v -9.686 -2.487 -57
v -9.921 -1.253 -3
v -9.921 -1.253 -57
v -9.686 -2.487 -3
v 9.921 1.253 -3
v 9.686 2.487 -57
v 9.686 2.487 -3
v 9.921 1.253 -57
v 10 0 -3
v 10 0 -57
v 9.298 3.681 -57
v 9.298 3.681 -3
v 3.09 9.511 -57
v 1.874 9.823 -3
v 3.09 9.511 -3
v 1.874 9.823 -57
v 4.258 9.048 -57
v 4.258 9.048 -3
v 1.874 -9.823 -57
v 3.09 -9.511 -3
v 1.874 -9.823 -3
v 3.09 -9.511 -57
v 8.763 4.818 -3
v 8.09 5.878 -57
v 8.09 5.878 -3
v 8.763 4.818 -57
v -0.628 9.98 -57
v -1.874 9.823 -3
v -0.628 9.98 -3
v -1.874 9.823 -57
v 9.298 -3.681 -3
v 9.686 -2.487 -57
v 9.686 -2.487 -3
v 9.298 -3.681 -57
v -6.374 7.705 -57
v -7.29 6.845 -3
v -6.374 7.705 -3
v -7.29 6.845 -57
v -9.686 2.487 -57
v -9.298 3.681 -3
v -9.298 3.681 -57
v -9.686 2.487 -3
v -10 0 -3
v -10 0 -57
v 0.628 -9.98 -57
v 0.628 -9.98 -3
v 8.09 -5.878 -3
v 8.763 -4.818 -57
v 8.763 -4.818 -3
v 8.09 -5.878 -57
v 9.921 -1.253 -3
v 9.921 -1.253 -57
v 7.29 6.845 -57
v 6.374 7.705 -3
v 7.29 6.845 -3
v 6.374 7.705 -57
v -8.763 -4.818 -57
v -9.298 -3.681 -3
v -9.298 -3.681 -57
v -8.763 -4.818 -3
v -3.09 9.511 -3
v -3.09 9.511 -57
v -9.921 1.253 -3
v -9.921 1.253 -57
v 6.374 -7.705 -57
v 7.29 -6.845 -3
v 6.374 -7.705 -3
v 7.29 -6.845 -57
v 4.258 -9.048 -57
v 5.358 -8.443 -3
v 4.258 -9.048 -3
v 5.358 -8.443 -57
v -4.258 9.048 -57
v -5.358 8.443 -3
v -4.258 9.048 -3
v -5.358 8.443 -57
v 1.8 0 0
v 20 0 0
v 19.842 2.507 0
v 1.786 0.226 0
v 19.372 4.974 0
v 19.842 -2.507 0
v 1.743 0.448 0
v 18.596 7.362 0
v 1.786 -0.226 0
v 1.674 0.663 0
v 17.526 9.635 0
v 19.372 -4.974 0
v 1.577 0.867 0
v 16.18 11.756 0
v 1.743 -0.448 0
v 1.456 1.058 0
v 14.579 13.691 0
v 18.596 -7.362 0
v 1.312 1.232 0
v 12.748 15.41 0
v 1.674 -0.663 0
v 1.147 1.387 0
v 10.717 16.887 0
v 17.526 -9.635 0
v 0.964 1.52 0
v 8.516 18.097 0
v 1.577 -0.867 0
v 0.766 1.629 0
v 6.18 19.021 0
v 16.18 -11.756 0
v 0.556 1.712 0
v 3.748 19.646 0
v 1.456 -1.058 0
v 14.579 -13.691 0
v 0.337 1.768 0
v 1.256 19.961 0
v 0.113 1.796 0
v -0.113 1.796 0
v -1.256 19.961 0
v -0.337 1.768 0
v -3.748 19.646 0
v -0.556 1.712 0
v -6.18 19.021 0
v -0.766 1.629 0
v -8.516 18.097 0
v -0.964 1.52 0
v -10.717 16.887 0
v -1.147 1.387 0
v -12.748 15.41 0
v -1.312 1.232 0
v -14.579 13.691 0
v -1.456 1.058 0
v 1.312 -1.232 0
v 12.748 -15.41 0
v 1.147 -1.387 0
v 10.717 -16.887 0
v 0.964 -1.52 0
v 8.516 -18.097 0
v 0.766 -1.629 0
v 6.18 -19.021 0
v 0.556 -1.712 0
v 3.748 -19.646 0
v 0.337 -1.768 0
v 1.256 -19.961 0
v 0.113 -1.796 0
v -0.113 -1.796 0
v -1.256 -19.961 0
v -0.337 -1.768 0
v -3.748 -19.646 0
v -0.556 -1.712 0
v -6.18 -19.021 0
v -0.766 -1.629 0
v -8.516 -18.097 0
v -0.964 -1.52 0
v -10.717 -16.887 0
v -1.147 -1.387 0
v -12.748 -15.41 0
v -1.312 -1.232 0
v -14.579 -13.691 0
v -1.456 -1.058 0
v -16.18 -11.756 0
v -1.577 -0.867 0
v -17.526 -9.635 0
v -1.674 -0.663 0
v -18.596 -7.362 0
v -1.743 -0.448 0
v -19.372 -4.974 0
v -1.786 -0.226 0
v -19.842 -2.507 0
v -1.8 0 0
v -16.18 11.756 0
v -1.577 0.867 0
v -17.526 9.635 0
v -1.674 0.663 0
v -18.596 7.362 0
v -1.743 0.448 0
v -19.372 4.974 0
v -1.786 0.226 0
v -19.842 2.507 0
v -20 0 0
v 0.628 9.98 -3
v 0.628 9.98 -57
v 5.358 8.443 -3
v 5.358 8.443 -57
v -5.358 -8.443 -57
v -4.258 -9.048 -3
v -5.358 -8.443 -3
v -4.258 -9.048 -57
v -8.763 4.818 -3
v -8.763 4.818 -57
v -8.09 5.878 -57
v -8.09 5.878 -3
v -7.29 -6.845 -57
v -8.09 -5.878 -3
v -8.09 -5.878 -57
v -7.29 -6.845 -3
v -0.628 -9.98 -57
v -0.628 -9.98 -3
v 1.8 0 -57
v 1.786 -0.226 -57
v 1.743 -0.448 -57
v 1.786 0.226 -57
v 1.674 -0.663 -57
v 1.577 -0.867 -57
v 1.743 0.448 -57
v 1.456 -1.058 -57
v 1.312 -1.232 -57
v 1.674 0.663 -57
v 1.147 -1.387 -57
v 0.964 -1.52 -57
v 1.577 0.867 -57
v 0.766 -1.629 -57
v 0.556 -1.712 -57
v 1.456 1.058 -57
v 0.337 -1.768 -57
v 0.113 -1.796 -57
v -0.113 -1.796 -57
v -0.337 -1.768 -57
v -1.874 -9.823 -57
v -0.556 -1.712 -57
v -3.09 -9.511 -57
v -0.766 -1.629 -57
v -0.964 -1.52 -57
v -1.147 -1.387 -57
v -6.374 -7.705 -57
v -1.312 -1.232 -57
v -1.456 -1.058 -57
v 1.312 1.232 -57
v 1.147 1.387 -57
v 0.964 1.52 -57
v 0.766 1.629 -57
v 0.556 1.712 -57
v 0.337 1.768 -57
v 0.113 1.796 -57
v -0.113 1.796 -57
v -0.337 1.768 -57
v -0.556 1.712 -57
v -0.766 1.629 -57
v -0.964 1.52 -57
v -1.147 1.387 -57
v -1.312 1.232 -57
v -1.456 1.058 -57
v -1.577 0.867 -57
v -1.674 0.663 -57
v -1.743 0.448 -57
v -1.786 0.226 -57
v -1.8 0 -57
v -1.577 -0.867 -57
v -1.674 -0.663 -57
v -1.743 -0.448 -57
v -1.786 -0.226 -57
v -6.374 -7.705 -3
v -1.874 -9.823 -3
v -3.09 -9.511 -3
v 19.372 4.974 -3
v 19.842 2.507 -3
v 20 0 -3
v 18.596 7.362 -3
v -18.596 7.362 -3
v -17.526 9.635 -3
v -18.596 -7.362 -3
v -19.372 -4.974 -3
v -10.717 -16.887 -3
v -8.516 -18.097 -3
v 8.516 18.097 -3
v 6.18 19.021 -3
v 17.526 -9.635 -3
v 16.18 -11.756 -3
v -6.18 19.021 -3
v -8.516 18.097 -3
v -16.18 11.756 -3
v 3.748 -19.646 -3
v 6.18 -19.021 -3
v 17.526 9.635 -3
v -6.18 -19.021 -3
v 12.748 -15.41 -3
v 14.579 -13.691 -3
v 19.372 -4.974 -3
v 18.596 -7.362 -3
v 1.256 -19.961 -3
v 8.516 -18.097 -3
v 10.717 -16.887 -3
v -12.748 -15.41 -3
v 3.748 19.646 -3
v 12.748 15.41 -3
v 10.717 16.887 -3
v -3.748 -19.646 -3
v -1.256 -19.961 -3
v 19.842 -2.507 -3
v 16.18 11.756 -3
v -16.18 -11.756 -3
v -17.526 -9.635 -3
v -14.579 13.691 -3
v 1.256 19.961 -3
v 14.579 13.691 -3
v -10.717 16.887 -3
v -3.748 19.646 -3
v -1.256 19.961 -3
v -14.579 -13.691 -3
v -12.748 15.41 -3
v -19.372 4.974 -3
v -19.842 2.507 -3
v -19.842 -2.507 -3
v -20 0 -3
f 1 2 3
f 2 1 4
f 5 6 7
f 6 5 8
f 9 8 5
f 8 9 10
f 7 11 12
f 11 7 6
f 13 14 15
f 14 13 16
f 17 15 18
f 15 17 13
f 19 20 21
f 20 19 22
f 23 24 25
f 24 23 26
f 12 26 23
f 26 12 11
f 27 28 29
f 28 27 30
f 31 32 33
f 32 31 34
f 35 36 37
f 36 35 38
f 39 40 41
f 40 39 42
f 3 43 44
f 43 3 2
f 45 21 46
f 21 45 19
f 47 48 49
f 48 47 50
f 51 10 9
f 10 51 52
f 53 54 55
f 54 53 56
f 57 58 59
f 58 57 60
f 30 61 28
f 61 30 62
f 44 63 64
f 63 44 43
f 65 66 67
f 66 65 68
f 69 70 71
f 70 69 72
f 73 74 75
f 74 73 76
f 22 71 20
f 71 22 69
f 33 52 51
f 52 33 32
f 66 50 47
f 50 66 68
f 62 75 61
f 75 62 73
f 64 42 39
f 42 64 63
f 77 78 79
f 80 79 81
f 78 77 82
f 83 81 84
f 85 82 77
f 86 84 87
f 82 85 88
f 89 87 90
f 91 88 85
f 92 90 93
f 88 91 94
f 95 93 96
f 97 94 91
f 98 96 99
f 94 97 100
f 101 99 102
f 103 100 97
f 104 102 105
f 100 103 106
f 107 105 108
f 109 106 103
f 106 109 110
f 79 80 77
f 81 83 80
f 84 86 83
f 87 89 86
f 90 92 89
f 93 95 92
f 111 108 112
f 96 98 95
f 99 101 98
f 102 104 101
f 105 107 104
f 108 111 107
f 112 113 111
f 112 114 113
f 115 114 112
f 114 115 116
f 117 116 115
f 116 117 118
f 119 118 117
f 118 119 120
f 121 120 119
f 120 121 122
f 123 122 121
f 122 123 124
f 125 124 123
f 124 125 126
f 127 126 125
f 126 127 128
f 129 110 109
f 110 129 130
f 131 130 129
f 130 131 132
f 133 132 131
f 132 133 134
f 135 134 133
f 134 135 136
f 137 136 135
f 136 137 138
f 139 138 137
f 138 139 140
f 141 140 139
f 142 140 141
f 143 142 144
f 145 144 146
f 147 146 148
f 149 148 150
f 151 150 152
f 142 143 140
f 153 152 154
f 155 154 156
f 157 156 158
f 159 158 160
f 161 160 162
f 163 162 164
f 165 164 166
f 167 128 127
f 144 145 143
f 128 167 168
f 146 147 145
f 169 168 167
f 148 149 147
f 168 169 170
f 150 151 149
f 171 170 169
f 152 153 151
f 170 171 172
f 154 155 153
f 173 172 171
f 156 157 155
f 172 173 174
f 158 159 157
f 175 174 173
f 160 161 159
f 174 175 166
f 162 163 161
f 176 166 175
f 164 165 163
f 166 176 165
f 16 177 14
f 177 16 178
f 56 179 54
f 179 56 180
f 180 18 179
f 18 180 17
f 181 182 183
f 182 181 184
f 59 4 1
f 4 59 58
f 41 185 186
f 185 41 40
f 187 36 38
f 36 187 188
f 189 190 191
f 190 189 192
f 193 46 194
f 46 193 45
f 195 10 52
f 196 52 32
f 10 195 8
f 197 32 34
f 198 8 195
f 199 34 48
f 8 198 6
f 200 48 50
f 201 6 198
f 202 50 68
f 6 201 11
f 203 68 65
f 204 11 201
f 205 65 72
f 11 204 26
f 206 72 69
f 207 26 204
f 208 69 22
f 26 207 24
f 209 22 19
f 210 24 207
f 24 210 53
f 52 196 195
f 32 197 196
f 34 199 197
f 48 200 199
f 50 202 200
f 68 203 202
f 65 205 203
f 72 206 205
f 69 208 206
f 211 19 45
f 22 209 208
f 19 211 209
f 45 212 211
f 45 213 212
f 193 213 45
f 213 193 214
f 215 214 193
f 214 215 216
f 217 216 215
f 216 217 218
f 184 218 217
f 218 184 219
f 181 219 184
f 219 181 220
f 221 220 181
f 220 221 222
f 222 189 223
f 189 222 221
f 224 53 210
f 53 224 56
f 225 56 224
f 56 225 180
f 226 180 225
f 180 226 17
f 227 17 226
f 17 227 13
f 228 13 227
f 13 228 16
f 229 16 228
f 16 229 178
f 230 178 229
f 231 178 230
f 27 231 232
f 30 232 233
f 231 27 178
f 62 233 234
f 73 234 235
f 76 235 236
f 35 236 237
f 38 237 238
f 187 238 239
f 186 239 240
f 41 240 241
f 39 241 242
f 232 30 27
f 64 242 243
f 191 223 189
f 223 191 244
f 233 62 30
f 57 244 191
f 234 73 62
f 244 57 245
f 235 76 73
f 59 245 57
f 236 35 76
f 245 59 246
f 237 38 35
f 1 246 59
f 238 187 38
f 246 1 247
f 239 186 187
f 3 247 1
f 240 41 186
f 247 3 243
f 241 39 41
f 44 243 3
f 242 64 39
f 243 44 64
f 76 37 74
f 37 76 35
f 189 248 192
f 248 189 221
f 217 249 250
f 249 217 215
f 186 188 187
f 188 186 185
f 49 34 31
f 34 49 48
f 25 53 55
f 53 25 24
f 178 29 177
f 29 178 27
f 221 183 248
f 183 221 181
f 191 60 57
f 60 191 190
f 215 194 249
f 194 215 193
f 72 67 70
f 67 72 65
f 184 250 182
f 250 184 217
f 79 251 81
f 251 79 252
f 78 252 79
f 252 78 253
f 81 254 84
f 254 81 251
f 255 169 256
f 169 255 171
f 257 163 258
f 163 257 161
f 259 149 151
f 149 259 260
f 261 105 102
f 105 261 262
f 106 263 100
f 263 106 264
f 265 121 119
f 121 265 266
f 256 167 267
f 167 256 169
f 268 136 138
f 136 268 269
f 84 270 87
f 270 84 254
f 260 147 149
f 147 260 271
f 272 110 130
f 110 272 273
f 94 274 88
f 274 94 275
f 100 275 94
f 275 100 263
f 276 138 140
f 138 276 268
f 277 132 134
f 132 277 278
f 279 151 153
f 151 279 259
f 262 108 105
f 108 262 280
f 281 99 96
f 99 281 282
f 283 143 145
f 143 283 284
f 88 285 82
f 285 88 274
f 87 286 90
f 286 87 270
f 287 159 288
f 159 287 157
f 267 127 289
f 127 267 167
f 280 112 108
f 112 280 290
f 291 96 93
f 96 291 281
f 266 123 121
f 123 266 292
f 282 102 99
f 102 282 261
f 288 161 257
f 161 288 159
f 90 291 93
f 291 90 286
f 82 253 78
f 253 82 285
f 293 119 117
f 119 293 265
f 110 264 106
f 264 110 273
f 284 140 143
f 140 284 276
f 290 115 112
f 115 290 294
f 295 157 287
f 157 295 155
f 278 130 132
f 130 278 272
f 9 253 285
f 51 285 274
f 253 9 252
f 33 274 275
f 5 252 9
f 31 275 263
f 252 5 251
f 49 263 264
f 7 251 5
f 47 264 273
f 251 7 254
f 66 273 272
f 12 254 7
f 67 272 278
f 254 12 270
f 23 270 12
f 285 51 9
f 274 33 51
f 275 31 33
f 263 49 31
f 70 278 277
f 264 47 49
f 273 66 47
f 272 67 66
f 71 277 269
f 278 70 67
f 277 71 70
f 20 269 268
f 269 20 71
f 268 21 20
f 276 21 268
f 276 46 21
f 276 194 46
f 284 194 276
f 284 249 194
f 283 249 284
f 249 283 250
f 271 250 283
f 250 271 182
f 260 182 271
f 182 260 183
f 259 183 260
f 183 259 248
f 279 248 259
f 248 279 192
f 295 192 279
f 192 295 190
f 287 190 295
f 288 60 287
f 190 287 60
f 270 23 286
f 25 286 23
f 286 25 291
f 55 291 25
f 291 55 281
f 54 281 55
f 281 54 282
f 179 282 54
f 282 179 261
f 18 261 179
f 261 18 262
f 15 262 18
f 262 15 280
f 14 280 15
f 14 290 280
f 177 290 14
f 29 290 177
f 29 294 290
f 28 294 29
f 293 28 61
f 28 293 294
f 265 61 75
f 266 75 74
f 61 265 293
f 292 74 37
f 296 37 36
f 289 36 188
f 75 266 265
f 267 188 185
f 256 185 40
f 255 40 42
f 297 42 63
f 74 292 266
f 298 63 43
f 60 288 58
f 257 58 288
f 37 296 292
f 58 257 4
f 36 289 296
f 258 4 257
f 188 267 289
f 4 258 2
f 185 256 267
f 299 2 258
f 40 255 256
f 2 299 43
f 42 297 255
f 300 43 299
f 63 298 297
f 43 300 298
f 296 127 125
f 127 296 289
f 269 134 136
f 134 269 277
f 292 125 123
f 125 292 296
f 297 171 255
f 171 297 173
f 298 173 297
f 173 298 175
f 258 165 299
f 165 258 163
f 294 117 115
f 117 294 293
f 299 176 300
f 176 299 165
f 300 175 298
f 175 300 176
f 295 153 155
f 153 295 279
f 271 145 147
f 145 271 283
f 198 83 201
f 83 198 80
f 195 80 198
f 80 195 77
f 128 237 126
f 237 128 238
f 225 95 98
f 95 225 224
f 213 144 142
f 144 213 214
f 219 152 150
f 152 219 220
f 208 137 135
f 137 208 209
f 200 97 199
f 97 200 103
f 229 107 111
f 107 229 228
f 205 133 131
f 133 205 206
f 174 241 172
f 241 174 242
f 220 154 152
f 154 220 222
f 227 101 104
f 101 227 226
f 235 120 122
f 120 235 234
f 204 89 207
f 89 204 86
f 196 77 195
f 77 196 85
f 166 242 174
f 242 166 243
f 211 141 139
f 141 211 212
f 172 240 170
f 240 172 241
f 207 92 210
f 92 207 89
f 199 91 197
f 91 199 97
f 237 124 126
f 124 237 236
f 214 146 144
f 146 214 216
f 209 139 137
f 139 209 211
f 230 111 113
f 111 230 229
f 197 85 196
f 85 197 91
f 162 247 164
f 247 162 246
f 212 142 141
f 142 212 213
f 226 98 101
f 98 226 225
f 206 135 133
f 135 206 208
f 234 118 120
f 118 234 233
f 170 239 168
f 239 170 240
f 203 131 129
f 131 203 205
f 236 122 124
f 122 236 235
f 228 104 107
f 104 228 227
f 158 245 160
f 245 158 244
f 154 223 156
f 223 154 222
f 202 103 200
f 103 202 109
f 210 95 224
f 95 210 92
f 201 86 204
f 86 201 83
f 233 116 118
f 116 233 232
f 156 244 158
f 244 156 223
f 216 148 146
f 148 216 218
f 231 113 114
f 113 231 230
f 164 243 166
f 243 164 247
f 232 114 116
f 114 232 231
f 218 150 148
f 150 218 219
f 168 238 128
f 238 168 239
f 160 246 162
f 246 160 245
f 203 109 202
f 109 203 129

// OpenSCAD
$fn = 50;


difference() {
	union() {
		translate(v = [0, 0, -57.0000000000]) {
			cylinder(h = 57, r = 10.0000000000);
		}
		translate(v = [0, 0, -3.0000000000]) {
			cylinder(h = 3, r = 20.0000000000);
		}
	}
	union() {
		#translate(v = [0, 0, -57]) {
			cylinder(h = 57, r = 1.8000000000);
		}
	}
}
